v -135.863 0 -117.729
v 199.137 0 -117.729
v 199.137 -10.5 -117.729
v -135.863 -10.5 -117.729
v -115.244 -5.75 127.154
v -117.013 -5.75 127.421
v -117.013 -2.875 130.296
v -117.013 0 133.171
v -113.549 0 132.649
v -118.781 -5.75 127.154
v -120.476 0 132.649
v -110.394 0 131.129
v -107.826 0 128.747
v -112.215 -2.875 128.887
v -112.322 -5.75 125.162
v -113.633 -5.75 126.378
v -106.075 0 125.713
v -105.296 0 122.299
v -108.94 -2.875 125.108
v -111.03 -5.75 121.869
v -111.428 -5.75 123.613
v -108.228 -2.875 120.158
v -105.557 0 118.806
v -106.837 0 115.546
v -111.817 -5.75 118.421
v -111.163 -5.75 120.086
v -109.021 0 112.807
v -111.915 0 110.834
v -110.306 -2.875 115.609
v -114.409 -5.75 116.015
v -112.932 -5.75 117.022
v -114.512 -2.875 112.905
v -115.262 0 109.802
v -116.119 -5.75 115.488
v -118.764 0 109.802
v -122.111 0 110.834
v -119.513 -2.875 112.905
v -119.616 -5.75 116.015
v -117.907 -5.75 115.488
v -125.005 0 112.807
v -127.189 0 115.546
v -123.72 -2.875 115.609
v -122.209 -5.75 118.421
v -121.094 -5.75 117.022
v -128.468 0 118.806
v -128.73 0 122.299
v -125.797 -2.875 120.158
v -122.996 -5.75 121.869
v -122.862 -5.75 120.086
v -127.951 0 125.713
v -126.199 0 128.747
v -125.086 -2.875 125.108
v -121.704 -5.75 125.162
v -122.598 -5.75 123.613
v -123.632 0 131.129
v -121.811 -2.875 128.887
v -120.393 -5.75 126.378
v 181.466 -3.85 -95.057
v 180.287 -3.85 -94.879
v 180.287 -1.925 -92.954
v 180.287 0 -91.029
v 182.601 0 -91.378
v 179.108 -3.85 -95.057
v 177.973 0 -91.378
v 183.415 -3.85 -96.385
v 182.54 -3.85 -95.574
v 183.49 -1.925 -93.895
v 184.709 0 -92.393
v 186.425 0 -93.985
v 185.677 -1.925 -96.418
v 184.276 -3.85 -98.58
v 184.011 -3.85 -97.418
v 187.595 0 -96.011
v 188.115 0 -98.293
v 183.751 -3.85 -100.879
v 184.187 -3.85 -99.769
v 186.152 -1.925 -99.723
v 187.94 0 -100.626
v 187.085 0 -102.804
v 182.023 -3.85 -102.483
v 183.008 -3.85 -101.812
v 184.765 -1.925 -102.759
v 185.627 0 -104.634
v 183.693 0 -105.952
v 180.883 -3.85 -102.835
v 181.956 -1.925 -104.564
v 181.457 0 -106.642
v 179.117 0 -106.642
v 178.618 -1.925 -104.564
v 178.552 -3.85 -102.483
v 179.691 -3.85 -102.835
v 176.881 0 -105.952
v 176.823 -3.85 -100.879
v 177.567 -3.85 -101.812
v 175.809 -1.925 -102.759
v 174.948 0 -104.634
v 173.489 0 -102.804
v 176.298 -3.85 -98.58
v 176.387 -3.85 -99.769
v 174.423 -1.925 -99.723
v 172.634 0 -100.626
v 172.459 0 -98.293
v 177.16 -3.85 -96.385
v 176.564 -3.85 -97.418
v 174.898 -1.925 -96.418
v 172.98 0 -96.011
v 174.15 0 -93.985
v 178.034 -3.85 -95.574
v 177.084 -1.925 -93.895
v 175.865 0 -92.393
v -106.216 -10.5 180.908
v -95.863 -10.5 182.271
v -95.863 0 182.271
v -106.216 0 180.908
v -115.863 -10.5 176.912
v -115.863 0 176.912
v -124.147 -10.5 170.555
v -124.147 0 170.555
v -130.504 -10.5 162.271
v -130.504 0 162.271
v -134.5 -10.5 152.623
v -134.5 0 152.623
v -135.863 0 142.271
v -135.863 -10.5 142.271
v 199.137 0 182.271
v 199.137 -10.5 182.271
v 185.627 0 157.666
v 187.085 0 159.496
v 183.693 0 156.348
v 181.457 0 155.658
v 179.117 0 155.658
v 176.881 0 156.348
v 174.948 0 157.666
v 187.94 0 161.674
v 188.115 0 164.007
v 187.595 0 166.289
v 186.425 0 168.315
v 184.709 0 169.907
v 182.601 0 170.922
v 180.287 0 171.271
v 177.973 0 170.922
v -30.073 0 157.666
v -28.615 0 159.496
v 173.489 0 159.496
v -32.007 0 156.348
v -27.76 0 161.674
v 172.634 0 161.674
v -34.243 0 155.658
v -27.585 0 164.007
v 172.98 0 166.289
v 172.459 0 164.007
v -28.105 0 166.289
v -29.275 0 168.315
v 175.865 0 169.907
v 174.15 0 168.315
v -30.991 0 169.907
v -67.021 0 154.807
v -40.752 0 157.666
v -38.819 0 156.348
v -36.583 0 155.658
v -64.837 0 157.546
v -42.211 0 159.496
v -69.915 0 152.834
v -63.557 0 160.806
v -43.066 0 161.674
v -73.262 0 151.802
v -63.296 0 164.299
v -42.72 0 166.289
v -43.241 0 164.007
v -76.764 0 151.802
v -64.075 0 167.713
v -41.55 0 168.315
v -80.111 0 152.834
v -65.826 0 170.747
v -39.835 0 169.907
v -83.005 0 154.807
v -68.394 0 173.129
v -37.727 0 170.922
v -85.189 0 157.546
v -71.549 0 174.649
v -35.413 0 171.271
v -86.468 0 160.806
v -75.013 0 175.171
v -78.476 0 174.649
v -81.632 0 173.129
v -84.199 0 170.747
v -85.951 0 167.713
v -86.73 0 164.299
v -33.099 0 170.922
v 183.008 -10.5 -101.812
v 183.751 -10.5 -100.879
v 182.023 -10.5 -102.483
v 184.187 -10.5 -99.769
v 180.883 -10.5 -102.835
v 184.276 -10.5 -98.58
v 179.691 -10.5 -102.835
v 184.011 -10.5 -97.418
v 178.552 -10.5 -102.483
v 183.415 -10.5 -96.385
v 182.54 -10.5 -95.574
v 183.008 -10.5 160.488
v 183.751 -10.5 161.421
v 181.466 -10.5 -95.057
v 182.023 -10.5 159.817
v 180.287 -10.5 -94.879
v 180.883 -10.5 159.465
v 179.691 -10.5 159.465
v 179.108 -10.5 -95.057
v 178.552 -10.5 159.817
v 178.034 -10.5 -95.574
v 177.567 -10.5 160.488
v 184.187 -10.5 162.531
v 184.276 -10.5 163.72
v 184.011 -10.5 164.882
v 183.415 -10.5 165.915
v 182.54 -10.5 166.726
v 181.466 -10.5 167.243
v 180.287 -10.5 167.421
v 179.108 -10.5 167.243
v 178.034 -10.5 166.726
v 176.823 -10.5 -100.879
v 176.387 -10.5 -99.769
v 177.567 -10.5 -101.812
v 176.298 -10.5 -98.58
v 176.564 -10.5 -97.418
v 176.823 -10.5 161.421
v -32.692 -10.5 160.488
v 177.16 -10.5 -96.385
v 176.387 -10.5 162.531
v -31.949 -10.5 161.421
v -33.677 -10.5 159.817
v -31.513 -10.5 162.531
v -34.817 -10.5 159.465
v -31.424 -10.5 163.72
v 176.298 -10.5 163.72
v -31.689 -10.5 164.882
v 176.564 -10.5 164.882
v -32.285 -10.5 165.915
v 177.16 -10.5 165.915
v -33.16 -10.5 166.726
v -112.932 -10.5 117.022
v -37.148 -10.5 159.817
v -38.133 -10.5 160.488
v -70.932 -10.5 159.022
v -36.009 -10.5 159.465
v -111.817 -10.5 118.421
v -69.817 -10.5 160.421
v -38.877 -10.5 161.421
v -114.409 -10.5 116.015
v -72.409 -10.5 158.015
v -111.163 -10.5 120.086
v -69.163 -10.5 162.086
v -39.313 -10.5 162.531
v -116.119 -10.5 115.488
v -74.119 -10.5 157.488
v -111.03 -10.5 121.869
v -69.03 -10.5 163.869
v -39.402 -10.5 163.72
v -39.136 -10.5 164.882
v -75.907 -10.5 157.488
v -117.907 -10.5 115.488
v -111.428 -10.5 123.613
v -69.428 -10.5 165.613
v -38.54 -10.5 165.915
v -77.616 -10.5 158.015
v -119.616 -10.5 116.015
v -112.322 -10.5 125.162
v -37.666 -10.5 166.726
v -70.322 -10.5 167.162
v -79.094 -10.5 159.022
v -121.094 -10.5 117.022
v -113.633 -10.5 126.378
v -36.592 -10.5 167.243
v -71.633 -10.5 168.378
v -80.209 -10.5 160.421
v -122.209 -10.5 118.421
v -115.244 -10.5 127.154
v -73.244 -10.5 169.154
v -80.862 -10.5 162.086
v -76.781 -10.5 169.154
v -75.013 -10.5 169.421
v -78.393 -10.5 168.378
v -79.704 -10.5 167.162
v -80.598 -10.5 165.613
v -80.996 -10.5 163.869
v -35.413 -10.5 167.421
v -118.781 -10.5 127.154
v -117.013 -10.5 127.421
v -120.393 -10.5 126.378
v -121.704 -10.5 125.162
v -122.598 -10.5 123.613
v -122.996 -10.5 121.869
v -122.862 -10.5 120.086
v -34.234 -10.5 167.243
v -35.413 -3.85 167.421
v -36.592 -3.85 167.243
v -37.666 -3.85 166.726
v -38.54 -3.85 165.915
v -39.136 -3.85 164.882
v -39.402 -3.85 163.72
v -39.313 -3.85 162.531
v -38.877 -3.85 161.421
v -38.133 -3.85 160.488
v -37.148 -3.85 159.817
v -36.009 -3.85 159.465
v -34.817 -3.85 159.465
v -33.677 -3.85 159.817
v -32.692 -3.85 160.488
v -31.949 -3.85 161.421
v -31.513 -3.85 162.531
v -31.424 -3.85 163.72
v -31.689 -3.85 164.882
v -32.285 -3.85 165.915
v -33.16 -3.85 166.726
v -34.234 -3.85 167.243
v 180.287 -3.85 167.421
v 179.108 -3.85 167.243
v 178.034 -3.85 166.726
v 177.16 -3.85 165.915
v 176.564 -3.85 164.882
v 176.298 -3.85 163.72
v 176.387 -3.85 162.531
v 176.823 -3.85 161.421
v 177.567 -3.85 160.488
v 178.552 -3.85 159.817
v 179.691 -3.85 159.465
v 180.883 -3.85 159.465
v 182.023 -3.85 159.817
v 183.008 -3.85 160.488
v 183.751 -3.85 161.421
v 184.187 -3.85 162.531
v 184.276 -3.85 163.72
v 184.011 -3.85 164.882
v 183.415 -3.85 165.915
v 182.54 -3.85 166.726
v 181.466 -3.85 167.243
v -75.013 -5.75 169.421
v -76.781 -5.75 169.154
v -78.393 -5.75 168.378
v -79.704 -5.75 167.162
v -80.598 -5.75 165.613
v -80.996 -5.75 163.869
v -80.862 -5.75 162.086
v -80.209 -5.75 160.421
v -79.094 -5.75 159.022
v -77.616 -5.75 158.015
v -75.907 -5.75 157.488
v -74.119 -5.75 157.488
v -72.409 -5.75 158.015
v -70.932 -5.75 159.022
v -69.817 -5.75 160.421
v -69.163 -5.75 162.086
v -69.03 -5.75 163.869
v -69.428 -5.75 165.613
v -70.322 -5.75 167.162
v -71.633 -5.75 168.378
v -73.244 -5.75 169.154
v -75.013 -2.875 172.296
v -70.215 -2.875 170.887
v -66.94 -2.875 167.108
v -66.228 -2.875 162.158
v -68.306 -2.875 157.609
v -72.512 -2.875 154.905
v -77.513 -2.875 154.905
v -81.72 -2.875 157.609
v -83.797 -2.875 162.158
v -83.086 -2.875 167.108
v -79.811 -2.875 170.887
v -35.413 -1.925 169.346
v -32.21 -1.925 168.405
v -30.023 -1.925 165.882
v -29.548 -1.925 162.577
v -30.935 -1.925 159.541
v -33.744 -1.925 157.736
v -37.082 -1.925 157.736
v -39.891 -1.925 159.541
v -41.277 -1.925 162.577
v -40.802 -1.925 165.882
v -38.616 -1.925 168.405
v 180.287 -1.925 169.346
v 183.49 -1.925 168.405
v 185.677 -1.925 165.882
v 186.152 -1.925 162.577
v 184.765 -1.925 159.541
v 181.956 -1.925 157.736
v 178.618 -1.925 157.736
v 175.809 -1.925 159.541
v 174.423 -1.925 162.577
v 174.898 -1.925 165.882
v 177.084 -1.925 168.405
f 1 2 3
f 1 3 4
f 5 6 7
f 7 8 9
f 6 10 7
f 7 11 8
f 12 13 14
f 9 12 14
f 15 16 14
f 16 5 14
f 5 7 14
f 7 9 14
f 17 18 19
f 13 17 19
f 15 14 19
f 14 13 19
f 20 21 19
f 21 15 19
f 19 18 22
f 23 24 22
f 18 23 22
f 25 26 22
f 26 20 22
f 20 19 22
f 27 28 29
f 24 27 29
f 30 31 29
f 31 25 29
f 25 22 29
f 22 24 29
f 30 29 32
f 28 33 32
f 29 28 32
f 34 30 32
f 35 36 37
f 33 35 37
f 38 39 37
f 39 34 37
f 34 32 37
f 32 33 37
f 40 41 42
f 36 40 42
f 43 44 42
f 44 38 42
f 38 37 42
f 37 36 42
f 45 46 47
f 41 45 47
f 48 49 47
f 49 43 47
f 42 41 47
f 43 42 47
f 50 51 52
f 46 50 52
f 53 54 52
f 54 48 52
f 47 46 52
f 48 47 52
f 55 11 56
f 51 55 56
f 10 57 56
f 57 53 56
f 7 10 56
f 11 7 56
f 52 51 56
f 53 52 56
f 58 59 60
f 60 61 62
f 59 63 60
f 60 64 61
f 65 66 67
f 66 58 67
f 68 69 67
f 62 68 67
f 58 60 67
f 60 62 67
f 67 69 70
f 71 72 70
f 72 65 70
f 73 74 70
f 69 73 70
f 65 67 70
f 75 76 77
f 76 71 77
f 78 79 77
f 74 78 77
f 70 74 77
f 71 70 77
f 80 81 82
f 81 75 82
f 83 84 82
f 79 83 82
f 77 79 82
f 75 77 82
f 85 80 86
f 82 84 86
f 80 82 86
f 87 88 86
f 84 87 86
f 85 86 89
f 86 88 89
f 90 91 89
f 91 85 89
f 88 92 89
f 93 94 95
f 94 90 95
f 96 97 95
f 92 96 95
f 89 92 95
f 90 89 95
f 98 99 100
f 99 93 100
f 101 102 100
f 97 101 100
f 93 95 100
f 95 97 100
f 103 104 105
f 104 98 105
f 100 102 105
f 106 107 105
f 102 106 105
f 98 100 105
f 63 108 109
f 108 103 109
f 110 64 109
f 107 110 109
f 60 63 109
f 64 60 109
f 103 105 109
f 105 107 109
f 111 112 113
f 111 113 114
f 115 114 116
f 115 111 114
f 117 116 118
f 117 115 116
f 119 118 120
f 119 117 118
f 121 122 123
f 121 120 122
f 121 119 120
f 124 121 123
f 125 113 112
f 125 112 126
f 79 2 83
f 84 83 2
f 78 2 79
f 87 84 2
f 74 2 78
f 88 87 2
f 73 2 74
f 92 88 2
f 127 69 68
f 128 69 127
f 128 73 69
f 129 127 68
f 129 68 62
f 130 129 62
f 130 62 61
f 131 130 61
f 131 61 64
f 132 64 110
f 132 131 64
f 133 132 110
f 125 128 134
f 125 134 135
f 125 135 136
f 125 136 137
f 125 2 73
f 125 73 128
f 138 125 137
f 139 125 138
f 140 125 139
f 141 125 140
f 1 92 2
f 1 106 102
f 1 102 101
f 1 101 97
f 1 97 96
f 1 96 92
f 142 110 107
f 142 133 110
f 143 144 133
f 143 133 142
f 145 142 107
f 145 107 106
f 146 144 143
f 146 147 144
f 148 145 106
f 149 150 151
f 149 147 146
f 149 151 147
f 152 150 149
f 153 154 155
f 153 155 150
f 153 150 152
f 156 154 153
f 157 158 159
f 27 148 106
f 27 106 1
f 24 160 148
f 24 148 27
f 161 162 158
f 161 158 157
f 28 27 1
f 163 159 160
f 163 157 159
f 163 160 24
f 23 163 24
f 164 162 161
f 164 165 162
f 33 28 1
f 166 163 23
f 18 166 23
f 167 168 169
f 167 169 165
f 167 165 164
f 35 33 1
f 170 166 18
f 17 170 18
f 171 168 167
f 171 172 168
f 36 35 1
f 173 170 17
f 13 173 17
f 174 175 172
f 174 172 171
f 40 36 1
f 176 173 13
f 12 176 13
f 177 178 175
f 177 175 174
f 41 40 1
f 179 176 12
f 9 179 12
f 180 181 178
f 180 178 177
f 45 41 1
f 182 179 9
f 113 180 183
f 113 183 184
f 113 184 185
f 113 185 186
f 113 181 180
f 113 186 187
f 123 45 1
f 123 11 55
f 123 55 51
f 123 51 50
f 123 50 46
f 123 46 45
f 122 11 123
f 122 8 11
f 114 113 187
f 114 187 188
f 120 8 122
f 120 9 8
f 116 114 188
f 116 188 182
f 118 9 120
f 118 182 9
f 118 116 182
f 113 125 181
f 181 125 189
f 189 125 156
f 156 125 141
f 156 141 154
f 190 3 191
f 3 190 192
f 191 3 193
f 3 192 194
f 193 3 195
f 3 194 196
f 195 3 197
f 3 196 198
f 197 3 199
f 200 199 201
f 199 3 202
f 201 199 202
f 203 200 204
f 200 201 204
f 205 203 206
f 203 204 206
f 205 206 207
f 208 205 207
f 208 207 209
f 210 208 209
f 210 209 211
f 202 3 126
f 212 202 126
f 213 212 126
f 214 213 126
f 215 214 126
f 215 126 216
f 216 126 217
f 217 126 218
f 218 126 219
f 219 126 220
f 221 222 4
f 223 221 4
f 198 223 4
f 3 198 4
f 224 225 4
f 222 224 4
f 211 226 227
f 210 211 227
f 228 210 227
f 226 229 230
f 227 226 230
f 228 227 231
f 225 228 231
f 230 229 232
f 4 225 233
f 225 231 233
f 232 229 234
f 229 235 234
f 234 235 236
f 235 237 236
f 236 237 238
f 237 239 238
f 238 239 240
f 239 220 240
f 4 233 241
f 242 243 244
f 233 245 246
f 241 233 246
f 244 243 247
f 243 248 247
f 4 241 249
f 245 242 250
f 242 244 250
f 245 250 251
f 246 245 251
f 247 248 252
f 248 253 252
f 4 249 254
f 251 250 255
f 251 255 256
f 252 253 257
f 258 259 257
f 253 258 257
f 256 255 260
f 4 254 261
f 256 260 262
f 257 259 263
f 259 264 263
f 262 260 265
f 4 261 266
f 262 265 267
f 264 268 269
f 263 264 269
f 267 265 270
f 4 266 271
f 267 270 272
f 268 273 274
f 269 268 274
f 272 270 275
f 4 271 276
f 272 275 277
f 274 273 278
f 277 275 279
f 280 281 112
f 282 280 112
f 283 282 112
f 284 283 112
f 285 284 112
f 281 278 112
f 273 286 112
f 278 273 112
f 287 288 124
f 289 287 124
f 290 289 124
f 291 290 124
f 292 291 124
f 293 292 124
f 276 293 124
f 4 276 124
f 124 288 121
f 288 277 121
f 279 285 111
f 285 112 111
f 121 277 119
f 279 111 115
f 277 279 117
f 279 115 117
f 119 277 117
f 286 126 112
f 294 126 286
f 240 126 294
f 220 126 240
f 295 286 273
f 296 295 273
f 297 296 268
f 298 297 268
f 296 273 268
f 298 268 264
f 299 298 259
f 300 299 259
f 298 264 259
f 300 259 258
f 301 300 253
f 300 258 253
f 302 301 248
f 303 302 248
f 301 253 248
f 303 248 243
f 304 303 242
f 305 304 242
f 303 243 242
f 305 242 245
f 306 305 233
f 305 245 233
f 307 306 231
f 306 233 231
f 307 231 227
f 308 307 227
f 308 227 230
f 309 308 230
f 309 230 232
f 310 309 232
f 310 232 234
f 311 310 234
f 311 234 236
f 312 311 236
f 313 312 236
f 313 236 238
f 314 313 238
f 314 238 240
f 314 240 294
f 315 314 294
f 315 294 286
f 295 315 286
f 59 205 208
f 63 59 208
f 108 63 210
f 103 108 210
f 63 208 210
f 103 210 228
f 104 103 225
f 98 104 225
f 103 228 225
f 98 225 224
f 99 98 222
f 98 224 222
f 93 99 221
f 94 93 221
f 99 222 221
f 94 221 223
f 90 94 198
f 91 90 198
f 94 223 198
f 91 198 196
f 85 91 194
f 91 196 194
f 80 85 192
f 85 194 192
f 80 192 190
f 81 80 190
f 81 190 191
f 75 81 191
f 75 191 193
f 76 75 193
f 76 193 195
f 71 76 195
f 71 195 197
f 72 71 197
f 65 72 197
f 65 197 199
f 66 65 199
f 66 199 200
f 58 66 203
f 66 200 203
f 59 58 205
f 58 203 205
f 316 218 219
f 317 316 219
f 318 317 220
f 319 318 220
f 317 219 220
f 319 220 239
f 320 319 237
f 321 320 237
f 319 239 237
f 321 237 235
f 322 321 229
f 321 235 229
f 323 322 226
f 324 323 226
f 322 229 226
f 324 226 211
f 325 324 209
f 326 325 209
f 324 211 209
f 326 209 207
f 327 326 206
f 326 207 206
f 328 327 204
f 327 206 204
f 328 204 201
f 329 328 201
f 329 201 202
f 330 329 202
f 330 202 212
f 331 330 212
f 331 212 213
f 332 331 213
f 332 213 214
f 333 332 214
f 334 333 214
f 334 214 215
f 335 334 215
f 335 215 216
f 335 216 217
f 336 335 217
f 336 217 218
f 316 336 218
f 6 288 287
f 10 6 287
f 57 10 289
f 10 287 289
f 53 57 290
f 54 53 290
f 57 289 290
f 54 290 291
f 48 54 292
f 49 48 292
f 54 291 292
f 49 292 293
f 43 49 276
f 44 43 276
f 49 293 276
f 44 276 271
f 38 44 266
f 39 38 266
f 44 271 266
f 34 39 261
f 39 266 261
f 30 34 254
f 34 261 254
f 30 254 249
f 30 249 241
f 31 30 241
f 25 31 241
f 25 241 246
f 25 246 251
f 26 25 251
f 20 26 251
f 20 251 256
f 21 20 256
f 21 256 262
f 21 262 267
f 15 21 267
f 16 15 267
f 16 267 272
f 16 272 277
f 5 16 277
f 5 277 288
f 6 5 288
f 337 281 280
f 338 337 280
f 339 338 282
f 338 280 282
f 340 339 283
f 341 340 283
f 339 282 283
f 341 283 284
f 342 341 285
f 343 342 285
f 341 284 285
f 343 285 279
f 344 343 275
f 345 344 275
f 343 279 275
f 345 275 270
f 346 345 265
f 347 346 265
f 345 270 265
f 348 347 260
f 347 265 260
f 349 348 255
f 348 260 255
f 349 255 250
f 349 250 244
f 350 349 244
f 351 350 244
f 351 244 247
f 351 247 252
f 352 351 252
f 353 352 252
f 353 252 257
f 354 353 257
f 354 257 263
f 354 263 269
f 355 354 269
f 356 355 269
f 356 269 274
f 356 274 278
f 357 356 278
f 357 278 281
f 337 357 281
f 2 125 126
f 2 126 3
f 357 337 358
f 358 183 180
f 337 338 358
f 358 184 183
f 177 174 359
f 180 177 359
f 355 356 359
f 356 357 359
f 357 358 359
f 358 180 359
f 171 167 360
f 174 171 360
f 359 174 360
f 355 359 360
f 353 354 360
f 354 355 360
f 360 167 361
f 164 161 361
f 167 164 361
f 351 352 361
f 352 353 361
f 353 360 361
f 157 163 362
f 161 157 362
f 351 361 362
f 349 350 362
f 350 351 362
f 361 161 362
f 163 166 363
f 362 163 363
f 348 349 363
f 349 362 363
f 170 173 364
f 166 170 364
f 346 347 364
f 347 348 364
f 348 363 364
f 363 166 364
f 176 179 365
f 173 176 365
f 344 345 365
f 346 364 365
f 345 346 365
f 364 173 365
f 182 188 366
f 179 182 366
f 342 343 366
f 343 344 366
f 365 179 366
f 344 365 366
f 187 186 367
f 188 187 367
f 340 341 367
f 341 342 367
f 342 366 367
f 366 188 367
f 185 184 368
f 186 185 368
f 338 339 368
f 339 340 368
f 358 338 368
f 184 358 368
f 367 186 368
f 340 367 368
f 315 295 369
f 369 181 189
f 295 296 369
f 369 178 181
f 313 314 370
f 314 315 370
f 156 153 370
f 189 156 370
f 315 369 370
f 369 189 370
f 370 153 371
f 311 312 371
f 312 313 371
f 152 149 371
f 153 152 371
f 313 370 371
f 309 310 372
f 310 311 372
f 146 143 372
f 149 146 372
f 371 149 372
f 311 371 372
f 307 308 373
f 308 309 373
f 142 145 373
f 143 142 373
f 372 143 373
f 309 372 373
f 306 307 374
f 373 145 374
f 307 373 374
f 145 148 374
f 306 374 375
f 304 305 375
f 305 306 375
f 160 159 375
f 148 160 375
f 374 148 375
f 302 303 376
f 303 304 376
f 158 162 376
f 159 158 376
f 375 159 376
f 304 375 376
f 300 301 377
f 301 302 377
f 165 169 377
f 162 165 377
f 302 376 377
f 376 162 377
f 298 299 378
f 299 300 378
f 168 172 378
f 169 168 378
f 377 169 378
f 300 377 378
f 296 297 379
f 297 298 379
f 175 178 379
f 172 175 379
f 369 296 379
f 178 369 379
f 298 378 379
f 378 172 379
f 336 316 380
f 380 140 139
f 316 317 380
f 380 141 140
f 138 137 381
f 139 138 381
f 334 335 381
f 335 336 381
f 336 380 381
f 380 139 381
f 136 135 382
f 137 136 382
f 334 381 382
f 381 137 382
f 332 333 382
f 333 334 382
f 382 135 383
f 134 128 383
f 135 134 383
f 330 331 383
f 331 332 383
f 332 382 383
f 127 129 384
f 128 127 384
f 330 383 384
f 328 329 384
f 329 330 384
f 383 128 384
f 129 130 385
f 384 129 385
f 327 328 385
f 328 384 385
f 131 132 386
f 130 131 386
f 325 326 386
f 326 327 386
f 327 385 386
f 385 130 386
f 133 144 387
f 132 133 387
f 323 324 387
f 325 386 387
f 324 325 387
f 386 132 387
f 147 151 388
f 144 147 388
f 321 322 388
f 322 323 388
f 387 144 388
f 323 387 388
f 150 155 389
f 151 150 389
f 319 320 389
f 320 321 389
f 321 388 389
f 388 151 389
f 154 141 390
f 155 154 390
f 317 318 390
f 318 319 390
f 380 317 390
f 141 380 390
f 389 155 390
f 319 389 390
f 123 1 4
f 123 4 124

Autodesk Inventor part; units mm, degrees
ref_plane "YZ Plane" through (0, 0, 0) normal (1, 0, 0) x (0, 1, 0)
ref_plane "XZ Plane" through (0, 0, 0) normal (0, 1, 0) x (-1, 0, 0)
ref_plane "XY Plane" through (0, 0, 0) normal (0, 0, 1) x (1, 0, 0)
sketch "Sketch1" plane through (0, 0, 0) normal (0, 1, 0) x (-1, 0, 0)
  line L0 (135.8628, 182.2707) -> (-199.1372, 182.2707)
  line L1 (-199.1372, 182.2707) -> (-199.1372, -117.7293)
  line L2 (-199.1372, -117.7293) -> (135.8628, -117.7293)
  line L3 (135.8628, -117.7293) -> (135.8628, 182.2707)
  circle A0 centre (-46.1372, -301.7293) radius 4.5 projected
  circle A1 centre (19.8628, -367.7293) radius 4.5 projected
  circle A2 centre (19.8628, -235.7293) radius 4.5 projected
  circle A3 centre (85.8628, -301.7293) radius 4.5 projected
  line L4 (83.3404, -354.6002) -> (128.9488, -400.2086) projected
  arc A4 (128.9488, -400.2086) -> (135.8628, -377.7293) centre (95.8628, -377.7293) ccw projected
  line L5 (135.8628, -377.7293) -> (135.8628, -117.7293) projected
  line L6 (135.8628, -117.7293) -> (-199.1372, -117.7293) projected
  line L7 (-199.1372, -117.7293) -> (-199.1372, -417.7293) projected
  line L8 (-199.1372, -417.7293) -> (95.8628, -417.7293) projected
  arc A5 (95.8628, -417.7293) -> (118.3422, -410.8152) centre (95.8628, -377.7293) ccw projected
  line L9 (118.3422, -410.8152) -> (72.7338, -365.2068) projected
  arc A6 (83.3404, -354.6002) -> (72.7338, -365.2068) centre (78.0371, -359.9035) ccw projected
  circle A7 centre (117.0128, -356.8793) radius 11.75 projected
  circle A8 centre (75.0128, -398.8793) radius 11.75 projected
  circle A9 centre (35.4128, -398.8793) radius 7.85 projected
  circle A10 centre (117.0128, -317.2793) radius 7.85 projected
  circle A11 centre (-180.2872, -136.5793) radius 7.85 projected
  circle A12 centre (-180.2872, -398.8793) radius 7.85 projected
  circle A13 centre (117.0128, -136.5793) radius 7.85 projected
  point P0 (0, 0)
  point P1 (117.0128, 121.4207)
  point P2 (75.0128, 163.4207)
  point P3 (35.4128, 163.4207)
  point P4 (-180.2872, -98.8793)
  point P5 (-180.2872, 163.4207)
  point P6 (117.0128, 121.4207)
  point P7 (75.0128, 163.4207)
  point P8 (35.4128, 163.4207)
  point P9 (-180.2872, 163.4207)
  point P10 (-180.2872, -98.8793)
  dimension "d0" = 335
  dimension "d1" = 300
  dimension "d2" = 0
  dimension "d3" = 0
extrude "Extrusion1" add sketch "Sketch1" against normal blind 10.5 contours L3 L2 L1 L0
hole "Hole1" at (-117.0128, 0, 121.4207) at (-75.0128, 0, 163.4207) direction (0, -1, 0) diameter 12 end through all countersink diameter 23.5 countersink angle 90
hole "Hole2" at (-35.4128, 0, 163.4207) at (180.2872, 0, 163.4207) at (180.2872, 0, -98.8793) direction (0, -1, 0) diameter 8 end through all countersink diameter 15.7 countersink angle 90
fillet "Fillet1" radius 40 1 edges at (-135.8628, -5.25, 182.2707)
properties part number "Left bottom plate"
